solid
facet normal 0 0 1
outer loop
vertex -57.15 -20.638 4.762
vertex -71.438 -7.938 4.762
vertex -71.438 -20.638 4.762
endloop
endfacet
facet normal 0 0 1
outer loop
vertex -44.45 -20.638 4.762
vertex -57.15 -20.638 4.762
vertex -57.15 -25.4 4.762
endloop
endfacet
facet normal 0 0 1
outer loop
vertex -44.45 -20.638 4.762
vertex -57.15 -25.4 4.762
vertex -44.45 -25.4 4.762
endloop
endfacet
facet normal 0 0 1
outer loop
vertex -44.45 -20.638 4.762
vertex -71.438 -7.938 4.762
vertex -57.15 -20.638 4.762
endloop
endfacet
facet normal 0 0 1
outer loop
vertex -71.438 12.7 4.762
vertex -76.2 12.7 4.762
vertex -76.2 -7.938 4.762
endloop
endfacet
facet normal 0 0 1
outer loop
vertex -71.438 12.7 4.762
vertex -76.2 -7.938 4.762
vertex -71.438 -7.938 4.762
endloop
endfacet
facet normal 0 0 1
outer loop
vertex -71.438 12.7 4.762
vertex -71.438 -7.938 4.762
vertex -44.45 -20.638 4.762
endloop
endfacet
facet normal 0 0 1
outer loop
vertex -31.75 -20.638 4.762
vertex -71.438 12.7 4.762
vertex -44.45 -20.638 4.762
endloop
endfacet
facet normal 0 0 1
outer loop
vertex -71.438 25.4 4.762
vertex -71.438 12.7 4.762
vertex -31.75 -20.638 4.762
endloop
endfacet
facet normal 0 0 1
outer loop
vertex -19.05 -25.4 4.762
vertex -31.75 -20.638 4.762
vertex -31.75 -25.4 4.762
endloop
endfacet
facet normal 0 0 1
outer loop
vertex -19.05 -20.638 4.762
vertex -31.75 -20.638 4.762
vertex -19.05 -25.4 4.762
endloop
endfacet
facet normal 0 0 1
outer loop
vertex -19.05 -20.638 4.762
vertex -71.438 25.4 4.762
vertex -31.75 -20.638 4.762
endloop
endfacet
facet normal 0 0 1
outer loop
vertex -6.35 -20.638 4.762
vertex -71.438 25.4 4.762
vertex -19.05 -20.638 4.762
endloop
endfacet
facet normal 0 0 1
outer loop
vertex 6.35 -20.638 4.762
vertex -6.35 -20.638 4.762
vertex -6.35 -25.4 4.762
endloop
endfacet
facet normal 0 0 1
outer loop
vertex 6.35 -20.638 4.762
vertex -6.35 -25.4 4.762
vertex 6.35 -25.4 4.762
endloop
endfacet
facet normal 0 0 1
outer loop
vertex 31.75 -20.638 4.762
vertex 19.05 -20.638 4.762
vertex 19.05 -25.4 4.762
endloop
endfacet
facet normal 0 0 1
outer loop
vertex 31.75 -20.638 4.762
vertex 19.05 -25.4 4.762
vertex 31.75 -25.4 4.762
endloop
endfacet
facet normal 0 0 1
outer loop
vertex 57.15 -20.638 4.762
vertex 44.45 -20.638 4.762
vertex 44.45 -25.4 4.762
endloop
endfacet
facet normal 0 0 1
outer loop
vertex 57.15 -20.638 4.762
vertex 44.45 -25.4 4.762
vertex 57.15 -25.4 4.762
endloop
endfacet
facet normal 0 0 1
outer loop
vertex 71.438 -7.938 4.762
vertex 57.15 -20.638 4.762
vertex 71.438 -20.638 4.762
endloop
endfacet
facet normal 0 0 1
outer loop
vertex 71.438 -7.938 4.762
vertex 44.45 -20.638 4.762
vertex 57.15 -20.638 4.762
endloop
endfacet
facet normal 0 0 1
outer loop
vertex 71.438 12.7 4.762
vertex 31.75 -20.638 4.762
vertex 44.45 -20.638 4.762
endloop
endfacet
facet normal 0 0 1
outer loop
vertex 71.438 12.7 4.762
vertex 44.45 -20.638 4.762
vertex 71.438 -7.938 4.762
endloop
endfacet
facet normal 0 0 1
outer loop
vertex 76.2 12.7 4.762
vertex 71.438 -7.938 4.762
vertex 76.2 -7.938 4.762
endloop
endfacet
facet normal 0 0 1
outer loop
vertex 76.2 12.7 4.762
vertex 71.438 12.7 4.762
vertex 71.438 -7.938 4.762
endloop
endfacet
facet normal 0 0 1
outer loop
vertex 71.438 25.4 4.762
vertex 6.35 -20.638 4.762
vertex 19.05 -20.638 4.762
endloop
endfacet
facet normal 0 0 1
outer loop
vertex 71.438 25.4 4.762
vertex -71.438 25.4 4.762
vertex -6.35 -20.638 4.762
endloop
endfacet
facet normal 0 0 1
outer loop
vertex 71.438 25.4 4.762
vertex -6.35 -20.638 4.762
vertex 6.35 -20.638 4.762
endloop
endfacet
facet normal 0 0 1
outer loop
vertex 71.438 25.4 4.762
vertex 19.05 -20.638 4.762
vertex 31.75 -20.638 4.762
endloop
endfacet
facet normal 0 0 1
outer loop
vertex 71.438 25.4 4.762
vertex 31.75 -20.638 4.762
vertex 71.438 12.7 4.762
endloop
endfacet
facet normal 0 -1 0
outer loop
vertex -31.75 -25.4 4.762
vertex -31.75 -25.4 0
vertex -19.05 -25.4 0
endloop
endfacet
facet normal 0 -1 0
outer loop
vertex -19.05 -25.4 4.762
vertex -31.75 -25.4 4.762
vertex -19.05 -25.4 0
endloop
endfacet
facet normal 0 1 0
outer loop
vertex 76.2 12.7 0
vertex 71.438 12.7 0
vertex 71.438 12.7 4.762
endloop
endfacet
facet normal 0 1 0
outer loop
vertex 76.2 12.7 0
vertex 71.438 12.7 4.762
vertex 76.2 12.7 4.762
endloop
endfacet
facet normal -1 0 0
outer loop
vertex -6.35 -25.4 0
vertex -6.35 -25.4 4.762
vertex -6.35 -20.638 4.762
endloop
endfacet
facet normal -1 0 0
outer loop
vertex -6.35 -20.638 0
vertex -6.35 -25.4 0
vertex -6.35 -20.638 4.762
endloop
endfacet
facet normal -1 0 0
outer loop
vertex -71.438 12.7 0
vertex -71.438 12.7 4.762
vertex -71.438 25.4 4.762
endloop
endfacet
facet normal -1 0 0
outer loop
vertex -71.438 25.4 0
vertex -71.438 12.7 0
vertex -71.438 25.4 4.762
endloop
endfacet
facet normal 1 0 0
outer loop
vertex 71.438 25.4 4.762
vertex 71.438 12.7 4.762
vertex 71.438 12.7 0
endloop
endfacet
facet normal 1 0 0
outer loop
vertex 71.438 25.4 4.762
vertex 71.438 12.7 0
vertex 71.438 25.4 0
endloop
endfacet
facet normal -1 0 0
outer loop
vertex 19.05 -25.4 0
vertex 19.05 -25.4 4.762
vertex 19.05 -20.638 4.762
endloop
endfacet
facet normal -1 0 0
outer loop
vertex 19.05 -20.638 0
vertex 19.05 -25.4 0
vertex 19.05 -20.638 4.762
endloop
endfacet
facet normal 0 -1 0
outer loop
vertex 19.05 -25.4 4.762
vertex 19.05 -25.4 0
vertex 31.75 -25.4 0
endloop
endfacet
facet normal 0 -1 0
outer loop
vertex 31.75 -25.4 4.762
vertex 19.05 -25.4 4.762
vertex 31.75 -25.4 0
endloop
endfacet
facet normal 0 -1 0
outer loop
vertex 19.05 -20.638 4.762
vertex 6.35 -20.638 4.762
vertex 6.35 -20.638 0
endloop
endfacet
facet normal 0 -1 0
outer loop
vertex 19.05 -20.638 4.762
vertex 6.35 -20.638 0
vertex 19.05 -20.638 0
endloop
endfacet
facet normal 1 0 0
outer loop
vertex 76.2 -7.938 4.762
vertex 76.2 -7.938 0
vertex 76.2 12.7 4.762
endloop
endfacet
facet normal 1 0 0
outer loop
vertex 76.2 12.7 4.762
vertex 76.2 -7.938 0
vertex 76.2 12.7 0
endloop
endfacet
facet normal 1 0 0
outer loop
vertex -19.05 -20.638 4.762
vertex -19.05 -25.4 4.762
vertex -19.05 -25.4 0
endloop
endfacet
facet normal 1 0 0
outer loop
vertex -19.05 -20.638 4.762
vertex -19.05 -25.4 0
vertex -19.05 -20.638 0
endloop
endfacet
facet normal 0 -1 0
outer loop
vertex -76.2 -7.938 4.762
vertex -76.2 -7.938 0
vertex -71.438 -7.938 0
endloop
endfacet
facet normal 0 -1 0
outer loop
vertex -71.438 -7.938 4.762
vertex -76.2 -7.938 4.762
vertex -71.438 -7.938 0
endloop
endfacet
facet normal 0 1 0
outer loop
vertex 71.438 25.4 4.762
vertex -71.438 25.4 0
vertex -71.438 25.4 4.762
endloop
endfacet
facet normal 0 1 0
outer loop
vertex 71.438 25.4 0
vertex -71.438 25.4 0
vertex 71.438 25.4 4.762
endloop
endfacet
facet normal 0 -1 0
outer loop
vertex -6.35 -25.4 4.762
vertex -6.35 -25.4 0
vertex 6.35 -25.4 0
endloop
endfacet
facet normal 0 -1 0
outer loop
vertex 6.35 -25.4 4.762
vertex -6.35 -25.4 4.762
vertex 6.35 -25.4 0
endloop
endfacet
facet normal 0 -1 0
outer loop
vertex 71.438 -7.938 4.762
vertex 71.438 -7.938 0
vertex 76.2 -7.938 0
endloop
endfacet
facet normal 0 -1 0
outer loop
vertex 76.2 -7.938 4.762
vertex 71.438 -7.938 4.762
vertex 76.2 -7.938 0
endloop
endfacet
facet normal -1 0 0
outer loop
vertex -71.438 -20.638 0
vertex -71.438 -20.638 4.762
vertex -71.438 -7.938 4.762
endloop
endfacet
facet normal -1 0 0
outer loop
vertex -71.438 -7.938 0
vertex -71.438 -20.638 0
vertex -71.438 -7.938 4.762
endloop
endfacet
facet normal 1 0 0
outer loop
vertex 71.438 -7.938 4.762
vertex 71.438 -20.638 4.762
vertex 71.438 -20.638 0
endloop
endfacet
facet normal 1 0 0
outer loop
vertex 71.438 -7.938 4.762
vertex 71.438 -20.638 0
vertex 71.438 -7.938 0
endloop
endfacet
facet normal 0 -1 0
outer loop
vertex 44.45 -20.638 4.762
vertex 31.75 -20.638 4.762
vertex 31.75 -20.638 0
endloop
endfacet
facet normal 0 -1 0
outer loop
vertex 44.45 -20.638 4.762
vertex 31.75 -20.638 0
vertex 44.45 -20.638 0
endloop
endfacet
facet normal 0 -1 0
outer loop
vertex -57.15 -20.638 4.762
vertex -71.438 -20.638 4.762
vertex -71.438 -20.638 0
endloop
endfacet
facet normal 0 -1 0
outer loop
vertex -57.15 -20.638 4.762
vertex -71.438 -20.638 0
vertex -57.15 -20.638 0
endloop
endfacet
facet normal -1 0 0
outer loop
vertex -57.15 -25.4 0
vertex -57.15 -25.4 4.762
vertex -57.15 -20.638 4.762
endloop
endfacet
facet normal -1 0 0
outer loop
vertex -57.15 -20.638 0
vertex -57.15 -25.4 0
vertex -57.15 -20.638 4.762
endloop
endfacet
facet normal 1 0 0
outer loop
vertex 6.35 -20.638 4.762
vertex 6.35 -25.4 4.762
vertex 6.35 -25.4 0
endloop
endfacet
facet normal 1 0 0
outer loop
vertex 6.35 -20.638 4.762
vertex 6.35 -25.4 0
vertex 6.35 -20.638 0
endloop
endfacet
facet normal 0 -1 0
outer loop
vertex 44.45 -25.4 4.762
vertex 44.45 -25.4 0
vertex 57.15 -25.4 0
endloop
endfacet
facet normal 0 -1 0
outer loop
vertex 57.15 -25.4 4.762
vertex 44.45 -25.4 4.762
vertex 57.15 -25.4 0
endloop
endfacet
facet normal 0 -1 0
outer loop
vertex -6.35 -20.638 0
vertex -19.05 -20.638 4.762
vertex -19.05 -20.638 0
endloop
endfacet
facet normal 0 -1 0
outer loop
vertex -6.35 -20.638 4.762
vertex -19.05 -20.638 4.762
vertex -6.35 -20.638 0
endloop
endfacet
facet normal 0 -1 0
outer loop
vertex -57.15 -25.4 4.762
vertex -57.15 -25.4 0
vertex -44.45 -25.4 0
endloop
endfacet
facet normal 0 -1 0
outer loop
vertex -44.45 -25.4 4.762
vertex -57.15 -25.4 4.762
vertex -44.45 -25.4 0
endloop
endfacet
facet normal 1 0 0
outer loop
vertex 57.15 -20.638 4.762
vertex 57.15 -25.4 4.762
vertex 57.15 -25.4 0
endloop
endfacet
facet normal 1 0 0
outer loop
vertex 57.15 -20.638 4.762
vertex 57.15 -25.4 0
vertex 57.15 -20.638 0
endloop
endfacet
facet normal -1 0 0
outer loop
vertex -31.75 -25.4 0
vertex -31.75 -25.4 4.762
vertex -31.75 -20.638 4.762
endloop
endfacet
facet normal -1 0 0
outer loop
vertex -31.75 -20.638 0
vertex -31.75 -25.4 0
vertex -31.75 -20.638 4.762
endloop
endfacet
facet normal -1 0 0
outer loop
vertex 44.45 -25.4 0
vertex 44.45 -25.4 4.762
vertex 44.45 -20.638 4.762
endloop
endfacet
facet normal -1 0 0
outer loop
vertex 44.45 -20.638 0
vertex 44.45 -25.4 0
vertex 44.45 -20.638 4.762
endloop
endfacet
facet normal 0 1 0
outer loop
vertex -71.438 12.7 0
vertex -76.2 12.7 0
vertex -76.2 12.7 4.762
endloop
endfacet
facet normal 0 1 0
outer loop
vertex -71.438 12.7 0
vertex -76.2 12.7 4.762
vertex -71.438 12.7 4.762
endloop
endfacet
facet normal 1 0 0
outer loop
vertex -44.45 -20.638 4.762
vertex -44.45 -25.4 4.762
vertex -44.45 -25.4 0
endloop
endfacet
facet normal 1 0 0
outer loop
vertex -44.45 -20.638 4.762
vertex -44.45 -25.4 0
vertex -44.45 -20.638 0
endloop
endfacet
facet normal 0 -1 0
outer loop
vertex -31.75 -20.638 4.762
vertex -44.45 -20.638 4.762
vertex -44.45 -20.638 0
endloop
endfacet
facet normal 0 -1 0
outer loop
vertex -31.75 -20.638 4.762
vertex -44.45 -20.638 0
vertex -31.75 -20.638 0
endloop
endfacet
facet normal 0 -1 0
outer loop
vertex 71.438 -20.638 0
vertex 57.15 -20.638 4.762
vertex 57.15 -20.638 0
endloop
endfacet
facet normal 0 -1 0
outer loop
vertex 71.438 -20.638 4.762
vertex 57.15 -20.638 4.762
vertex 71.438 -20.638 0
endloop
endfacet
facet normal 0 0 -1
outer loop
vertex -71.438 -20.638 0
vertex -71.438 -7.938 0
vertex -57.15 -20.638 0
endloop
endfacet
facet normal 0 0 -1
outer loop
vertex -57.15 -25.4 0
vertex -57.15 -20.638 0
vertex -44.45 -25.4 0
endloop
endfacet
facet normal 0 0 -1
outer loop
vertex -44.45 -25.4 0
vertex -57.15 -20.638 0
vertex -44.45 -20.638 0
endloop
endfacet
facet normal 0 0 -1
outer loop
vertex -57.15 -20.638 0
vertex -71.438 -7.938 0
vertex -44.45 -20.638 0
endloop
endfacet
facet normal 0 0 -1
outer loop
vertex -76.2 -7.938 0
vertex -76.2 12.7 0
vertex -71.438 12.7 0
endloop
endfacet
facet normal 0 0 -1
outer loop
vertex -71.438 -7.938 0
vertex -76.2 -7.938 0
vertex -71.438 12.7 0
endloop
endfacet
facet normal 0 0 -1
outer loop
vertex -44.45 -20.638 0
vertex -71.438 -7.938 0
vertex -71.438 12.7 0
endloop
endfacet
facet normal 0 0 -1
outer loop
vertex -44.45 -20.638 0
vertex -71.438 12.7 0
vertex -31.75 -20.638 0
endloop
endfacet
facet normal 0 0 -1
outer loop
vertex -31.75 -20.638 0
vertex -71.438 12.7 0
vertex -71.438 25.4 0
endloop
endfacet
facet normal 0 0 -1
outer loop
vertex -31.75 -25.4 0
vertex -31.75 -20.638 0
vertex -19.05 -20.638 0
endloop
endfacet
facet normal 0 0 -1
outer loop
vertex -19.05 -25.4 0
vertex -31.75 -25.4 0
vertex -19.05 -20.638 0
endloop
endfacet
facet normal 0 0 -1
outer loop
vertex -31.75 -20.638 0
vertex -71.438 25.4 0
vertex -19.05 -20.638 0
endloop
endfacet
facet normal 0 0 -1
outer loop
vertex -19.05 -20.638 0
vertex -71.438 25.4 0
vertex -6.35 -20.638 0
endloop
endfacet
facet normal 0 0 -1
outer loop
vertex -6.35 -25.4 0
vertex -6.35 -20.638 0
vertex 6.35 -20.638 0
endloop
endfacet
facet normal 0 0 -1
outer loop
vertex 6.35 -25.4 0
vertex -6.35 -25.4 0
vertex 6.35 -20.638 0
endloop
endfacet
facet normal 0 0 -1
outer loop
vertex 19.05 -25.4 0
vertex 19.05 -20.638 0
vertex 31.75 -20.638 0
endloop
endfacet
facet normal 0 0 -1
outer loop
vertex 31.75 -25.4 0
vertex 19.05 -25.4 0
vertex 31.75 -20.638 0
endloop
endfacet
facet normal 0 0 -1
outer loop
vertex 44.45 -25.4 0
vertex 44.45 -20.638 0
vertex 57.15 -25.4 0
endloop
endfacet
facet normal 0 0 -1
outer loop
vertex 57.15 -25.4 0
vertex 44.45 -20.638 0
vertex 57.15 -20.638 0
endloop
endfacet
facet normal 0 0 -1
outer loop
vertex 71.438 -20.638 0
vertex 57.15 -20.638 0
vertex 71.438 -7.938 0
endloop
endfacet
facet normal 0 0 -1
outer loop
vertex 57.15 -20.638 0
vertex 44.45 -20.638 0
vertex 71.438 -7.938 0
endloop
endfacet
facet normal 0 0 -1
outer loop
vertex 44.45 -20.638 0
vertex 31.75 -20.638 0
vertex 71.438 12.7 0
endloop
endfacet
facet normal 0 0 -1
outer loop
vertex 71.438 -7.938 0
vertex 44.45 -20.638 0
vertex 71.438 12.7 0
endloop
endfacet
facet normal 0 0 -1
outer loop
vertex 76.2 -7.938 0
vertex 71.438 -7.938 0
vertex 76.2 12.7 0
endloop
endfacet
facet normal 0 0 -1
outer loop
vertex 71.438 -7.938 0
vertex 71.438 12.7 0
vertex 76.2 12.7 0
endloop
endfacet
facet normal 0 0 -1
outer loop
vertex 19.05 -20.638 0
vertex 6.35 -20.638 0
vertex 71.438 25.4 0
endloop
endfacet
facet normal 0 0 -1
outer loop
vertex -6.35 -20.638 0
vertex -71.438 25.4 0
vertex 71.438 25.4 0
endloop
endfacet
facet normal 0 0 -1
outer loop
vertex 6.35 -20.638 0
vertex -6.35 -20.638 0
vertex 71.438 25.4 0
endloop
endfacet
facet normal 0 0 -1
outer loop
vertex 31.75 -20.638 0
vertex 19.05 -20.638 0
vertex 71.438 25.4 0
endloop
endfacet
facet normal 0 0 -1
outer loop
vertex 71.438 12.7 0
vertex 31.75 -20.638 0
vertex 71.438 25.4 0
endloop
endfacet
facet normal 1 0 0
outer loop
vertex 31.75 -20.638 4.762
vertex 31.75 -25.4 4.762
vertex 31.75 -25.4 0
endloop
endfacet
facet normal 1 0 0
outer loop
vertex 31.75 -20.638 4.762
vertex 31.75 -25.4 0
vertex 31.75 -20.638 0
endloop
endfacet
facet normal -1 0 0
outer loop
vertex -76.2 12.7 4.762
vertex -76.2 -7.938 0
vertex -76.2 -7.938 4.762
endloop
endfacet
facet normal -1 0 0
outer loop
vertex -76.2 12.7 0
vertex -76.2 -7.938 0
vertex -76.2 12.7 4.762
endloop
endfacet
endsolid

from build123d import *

# Parameters (mm, degrees)
F0_W     = 152.4
F0_H     = 50.8
F1_DEPTH = 4.7625
F2_W     = 19.05
F2_H     = 4.7625
F2_W_2   = 12.7
F3_DEPTH = 25.4
F4_W     = 4.7625
F4_H     = 12.7
F5_DEPTH = 25.4


with BuildPart() as f1:
    # F0 (on Top) → F1 (new body)
    with BuildSketch(Plane.XY):
        Rectangle(F0_W, F0_H)
    extrude(amount=F1_DEPTH)

    # F2 (on face) → F3 (cut)
    with BuildSketch(Plane.XY.offset(4.7625)):
        with Locations((-66.675, -23.01875)):
            Rectangle(F2_W, F2_H)
        with Locations((-38.1, -23.01875)):
            Rectangle(F2_W_2, F2_H)
        with Locations((-12.7, -23.01875)):
            Rectangle(F2_W_2, F2_H)
        with Locations((12.7, -23.01875)):
            Rectangle(F2_W_2, F2_H)
        with Locations((66.675, -23.01875)):
            Rectangle(F2_W, F2_H)
        with Locations((38.1, -23.01875)):
            Rectangle(F2_W_2, F2_H)
    extrude(amount=-F3_DEPTH, mode=Mode.SUBTRACT)

    # F4 (on face) → F5 (cut)
    with BuildSketch(Plane.XY.offset(4.7625)):
        with Locations((-73.81875, 19.05)):
            Rectangle(F4_W, F4_H)
        with Locations((-73.81875, -14.2875)):
            Rectangle(F4_W, F4_H)
        with Locations((73.81875, 19.05)):
            Rectangle(F4_W, F4_H)
        with Locations((73.81875, -14.2875)):
            Rectangle(F4_W, F4_H)
    extrude(amount=-F5_DEPTH, mode=Mode.SUBTRACT)


solid = f1.part
